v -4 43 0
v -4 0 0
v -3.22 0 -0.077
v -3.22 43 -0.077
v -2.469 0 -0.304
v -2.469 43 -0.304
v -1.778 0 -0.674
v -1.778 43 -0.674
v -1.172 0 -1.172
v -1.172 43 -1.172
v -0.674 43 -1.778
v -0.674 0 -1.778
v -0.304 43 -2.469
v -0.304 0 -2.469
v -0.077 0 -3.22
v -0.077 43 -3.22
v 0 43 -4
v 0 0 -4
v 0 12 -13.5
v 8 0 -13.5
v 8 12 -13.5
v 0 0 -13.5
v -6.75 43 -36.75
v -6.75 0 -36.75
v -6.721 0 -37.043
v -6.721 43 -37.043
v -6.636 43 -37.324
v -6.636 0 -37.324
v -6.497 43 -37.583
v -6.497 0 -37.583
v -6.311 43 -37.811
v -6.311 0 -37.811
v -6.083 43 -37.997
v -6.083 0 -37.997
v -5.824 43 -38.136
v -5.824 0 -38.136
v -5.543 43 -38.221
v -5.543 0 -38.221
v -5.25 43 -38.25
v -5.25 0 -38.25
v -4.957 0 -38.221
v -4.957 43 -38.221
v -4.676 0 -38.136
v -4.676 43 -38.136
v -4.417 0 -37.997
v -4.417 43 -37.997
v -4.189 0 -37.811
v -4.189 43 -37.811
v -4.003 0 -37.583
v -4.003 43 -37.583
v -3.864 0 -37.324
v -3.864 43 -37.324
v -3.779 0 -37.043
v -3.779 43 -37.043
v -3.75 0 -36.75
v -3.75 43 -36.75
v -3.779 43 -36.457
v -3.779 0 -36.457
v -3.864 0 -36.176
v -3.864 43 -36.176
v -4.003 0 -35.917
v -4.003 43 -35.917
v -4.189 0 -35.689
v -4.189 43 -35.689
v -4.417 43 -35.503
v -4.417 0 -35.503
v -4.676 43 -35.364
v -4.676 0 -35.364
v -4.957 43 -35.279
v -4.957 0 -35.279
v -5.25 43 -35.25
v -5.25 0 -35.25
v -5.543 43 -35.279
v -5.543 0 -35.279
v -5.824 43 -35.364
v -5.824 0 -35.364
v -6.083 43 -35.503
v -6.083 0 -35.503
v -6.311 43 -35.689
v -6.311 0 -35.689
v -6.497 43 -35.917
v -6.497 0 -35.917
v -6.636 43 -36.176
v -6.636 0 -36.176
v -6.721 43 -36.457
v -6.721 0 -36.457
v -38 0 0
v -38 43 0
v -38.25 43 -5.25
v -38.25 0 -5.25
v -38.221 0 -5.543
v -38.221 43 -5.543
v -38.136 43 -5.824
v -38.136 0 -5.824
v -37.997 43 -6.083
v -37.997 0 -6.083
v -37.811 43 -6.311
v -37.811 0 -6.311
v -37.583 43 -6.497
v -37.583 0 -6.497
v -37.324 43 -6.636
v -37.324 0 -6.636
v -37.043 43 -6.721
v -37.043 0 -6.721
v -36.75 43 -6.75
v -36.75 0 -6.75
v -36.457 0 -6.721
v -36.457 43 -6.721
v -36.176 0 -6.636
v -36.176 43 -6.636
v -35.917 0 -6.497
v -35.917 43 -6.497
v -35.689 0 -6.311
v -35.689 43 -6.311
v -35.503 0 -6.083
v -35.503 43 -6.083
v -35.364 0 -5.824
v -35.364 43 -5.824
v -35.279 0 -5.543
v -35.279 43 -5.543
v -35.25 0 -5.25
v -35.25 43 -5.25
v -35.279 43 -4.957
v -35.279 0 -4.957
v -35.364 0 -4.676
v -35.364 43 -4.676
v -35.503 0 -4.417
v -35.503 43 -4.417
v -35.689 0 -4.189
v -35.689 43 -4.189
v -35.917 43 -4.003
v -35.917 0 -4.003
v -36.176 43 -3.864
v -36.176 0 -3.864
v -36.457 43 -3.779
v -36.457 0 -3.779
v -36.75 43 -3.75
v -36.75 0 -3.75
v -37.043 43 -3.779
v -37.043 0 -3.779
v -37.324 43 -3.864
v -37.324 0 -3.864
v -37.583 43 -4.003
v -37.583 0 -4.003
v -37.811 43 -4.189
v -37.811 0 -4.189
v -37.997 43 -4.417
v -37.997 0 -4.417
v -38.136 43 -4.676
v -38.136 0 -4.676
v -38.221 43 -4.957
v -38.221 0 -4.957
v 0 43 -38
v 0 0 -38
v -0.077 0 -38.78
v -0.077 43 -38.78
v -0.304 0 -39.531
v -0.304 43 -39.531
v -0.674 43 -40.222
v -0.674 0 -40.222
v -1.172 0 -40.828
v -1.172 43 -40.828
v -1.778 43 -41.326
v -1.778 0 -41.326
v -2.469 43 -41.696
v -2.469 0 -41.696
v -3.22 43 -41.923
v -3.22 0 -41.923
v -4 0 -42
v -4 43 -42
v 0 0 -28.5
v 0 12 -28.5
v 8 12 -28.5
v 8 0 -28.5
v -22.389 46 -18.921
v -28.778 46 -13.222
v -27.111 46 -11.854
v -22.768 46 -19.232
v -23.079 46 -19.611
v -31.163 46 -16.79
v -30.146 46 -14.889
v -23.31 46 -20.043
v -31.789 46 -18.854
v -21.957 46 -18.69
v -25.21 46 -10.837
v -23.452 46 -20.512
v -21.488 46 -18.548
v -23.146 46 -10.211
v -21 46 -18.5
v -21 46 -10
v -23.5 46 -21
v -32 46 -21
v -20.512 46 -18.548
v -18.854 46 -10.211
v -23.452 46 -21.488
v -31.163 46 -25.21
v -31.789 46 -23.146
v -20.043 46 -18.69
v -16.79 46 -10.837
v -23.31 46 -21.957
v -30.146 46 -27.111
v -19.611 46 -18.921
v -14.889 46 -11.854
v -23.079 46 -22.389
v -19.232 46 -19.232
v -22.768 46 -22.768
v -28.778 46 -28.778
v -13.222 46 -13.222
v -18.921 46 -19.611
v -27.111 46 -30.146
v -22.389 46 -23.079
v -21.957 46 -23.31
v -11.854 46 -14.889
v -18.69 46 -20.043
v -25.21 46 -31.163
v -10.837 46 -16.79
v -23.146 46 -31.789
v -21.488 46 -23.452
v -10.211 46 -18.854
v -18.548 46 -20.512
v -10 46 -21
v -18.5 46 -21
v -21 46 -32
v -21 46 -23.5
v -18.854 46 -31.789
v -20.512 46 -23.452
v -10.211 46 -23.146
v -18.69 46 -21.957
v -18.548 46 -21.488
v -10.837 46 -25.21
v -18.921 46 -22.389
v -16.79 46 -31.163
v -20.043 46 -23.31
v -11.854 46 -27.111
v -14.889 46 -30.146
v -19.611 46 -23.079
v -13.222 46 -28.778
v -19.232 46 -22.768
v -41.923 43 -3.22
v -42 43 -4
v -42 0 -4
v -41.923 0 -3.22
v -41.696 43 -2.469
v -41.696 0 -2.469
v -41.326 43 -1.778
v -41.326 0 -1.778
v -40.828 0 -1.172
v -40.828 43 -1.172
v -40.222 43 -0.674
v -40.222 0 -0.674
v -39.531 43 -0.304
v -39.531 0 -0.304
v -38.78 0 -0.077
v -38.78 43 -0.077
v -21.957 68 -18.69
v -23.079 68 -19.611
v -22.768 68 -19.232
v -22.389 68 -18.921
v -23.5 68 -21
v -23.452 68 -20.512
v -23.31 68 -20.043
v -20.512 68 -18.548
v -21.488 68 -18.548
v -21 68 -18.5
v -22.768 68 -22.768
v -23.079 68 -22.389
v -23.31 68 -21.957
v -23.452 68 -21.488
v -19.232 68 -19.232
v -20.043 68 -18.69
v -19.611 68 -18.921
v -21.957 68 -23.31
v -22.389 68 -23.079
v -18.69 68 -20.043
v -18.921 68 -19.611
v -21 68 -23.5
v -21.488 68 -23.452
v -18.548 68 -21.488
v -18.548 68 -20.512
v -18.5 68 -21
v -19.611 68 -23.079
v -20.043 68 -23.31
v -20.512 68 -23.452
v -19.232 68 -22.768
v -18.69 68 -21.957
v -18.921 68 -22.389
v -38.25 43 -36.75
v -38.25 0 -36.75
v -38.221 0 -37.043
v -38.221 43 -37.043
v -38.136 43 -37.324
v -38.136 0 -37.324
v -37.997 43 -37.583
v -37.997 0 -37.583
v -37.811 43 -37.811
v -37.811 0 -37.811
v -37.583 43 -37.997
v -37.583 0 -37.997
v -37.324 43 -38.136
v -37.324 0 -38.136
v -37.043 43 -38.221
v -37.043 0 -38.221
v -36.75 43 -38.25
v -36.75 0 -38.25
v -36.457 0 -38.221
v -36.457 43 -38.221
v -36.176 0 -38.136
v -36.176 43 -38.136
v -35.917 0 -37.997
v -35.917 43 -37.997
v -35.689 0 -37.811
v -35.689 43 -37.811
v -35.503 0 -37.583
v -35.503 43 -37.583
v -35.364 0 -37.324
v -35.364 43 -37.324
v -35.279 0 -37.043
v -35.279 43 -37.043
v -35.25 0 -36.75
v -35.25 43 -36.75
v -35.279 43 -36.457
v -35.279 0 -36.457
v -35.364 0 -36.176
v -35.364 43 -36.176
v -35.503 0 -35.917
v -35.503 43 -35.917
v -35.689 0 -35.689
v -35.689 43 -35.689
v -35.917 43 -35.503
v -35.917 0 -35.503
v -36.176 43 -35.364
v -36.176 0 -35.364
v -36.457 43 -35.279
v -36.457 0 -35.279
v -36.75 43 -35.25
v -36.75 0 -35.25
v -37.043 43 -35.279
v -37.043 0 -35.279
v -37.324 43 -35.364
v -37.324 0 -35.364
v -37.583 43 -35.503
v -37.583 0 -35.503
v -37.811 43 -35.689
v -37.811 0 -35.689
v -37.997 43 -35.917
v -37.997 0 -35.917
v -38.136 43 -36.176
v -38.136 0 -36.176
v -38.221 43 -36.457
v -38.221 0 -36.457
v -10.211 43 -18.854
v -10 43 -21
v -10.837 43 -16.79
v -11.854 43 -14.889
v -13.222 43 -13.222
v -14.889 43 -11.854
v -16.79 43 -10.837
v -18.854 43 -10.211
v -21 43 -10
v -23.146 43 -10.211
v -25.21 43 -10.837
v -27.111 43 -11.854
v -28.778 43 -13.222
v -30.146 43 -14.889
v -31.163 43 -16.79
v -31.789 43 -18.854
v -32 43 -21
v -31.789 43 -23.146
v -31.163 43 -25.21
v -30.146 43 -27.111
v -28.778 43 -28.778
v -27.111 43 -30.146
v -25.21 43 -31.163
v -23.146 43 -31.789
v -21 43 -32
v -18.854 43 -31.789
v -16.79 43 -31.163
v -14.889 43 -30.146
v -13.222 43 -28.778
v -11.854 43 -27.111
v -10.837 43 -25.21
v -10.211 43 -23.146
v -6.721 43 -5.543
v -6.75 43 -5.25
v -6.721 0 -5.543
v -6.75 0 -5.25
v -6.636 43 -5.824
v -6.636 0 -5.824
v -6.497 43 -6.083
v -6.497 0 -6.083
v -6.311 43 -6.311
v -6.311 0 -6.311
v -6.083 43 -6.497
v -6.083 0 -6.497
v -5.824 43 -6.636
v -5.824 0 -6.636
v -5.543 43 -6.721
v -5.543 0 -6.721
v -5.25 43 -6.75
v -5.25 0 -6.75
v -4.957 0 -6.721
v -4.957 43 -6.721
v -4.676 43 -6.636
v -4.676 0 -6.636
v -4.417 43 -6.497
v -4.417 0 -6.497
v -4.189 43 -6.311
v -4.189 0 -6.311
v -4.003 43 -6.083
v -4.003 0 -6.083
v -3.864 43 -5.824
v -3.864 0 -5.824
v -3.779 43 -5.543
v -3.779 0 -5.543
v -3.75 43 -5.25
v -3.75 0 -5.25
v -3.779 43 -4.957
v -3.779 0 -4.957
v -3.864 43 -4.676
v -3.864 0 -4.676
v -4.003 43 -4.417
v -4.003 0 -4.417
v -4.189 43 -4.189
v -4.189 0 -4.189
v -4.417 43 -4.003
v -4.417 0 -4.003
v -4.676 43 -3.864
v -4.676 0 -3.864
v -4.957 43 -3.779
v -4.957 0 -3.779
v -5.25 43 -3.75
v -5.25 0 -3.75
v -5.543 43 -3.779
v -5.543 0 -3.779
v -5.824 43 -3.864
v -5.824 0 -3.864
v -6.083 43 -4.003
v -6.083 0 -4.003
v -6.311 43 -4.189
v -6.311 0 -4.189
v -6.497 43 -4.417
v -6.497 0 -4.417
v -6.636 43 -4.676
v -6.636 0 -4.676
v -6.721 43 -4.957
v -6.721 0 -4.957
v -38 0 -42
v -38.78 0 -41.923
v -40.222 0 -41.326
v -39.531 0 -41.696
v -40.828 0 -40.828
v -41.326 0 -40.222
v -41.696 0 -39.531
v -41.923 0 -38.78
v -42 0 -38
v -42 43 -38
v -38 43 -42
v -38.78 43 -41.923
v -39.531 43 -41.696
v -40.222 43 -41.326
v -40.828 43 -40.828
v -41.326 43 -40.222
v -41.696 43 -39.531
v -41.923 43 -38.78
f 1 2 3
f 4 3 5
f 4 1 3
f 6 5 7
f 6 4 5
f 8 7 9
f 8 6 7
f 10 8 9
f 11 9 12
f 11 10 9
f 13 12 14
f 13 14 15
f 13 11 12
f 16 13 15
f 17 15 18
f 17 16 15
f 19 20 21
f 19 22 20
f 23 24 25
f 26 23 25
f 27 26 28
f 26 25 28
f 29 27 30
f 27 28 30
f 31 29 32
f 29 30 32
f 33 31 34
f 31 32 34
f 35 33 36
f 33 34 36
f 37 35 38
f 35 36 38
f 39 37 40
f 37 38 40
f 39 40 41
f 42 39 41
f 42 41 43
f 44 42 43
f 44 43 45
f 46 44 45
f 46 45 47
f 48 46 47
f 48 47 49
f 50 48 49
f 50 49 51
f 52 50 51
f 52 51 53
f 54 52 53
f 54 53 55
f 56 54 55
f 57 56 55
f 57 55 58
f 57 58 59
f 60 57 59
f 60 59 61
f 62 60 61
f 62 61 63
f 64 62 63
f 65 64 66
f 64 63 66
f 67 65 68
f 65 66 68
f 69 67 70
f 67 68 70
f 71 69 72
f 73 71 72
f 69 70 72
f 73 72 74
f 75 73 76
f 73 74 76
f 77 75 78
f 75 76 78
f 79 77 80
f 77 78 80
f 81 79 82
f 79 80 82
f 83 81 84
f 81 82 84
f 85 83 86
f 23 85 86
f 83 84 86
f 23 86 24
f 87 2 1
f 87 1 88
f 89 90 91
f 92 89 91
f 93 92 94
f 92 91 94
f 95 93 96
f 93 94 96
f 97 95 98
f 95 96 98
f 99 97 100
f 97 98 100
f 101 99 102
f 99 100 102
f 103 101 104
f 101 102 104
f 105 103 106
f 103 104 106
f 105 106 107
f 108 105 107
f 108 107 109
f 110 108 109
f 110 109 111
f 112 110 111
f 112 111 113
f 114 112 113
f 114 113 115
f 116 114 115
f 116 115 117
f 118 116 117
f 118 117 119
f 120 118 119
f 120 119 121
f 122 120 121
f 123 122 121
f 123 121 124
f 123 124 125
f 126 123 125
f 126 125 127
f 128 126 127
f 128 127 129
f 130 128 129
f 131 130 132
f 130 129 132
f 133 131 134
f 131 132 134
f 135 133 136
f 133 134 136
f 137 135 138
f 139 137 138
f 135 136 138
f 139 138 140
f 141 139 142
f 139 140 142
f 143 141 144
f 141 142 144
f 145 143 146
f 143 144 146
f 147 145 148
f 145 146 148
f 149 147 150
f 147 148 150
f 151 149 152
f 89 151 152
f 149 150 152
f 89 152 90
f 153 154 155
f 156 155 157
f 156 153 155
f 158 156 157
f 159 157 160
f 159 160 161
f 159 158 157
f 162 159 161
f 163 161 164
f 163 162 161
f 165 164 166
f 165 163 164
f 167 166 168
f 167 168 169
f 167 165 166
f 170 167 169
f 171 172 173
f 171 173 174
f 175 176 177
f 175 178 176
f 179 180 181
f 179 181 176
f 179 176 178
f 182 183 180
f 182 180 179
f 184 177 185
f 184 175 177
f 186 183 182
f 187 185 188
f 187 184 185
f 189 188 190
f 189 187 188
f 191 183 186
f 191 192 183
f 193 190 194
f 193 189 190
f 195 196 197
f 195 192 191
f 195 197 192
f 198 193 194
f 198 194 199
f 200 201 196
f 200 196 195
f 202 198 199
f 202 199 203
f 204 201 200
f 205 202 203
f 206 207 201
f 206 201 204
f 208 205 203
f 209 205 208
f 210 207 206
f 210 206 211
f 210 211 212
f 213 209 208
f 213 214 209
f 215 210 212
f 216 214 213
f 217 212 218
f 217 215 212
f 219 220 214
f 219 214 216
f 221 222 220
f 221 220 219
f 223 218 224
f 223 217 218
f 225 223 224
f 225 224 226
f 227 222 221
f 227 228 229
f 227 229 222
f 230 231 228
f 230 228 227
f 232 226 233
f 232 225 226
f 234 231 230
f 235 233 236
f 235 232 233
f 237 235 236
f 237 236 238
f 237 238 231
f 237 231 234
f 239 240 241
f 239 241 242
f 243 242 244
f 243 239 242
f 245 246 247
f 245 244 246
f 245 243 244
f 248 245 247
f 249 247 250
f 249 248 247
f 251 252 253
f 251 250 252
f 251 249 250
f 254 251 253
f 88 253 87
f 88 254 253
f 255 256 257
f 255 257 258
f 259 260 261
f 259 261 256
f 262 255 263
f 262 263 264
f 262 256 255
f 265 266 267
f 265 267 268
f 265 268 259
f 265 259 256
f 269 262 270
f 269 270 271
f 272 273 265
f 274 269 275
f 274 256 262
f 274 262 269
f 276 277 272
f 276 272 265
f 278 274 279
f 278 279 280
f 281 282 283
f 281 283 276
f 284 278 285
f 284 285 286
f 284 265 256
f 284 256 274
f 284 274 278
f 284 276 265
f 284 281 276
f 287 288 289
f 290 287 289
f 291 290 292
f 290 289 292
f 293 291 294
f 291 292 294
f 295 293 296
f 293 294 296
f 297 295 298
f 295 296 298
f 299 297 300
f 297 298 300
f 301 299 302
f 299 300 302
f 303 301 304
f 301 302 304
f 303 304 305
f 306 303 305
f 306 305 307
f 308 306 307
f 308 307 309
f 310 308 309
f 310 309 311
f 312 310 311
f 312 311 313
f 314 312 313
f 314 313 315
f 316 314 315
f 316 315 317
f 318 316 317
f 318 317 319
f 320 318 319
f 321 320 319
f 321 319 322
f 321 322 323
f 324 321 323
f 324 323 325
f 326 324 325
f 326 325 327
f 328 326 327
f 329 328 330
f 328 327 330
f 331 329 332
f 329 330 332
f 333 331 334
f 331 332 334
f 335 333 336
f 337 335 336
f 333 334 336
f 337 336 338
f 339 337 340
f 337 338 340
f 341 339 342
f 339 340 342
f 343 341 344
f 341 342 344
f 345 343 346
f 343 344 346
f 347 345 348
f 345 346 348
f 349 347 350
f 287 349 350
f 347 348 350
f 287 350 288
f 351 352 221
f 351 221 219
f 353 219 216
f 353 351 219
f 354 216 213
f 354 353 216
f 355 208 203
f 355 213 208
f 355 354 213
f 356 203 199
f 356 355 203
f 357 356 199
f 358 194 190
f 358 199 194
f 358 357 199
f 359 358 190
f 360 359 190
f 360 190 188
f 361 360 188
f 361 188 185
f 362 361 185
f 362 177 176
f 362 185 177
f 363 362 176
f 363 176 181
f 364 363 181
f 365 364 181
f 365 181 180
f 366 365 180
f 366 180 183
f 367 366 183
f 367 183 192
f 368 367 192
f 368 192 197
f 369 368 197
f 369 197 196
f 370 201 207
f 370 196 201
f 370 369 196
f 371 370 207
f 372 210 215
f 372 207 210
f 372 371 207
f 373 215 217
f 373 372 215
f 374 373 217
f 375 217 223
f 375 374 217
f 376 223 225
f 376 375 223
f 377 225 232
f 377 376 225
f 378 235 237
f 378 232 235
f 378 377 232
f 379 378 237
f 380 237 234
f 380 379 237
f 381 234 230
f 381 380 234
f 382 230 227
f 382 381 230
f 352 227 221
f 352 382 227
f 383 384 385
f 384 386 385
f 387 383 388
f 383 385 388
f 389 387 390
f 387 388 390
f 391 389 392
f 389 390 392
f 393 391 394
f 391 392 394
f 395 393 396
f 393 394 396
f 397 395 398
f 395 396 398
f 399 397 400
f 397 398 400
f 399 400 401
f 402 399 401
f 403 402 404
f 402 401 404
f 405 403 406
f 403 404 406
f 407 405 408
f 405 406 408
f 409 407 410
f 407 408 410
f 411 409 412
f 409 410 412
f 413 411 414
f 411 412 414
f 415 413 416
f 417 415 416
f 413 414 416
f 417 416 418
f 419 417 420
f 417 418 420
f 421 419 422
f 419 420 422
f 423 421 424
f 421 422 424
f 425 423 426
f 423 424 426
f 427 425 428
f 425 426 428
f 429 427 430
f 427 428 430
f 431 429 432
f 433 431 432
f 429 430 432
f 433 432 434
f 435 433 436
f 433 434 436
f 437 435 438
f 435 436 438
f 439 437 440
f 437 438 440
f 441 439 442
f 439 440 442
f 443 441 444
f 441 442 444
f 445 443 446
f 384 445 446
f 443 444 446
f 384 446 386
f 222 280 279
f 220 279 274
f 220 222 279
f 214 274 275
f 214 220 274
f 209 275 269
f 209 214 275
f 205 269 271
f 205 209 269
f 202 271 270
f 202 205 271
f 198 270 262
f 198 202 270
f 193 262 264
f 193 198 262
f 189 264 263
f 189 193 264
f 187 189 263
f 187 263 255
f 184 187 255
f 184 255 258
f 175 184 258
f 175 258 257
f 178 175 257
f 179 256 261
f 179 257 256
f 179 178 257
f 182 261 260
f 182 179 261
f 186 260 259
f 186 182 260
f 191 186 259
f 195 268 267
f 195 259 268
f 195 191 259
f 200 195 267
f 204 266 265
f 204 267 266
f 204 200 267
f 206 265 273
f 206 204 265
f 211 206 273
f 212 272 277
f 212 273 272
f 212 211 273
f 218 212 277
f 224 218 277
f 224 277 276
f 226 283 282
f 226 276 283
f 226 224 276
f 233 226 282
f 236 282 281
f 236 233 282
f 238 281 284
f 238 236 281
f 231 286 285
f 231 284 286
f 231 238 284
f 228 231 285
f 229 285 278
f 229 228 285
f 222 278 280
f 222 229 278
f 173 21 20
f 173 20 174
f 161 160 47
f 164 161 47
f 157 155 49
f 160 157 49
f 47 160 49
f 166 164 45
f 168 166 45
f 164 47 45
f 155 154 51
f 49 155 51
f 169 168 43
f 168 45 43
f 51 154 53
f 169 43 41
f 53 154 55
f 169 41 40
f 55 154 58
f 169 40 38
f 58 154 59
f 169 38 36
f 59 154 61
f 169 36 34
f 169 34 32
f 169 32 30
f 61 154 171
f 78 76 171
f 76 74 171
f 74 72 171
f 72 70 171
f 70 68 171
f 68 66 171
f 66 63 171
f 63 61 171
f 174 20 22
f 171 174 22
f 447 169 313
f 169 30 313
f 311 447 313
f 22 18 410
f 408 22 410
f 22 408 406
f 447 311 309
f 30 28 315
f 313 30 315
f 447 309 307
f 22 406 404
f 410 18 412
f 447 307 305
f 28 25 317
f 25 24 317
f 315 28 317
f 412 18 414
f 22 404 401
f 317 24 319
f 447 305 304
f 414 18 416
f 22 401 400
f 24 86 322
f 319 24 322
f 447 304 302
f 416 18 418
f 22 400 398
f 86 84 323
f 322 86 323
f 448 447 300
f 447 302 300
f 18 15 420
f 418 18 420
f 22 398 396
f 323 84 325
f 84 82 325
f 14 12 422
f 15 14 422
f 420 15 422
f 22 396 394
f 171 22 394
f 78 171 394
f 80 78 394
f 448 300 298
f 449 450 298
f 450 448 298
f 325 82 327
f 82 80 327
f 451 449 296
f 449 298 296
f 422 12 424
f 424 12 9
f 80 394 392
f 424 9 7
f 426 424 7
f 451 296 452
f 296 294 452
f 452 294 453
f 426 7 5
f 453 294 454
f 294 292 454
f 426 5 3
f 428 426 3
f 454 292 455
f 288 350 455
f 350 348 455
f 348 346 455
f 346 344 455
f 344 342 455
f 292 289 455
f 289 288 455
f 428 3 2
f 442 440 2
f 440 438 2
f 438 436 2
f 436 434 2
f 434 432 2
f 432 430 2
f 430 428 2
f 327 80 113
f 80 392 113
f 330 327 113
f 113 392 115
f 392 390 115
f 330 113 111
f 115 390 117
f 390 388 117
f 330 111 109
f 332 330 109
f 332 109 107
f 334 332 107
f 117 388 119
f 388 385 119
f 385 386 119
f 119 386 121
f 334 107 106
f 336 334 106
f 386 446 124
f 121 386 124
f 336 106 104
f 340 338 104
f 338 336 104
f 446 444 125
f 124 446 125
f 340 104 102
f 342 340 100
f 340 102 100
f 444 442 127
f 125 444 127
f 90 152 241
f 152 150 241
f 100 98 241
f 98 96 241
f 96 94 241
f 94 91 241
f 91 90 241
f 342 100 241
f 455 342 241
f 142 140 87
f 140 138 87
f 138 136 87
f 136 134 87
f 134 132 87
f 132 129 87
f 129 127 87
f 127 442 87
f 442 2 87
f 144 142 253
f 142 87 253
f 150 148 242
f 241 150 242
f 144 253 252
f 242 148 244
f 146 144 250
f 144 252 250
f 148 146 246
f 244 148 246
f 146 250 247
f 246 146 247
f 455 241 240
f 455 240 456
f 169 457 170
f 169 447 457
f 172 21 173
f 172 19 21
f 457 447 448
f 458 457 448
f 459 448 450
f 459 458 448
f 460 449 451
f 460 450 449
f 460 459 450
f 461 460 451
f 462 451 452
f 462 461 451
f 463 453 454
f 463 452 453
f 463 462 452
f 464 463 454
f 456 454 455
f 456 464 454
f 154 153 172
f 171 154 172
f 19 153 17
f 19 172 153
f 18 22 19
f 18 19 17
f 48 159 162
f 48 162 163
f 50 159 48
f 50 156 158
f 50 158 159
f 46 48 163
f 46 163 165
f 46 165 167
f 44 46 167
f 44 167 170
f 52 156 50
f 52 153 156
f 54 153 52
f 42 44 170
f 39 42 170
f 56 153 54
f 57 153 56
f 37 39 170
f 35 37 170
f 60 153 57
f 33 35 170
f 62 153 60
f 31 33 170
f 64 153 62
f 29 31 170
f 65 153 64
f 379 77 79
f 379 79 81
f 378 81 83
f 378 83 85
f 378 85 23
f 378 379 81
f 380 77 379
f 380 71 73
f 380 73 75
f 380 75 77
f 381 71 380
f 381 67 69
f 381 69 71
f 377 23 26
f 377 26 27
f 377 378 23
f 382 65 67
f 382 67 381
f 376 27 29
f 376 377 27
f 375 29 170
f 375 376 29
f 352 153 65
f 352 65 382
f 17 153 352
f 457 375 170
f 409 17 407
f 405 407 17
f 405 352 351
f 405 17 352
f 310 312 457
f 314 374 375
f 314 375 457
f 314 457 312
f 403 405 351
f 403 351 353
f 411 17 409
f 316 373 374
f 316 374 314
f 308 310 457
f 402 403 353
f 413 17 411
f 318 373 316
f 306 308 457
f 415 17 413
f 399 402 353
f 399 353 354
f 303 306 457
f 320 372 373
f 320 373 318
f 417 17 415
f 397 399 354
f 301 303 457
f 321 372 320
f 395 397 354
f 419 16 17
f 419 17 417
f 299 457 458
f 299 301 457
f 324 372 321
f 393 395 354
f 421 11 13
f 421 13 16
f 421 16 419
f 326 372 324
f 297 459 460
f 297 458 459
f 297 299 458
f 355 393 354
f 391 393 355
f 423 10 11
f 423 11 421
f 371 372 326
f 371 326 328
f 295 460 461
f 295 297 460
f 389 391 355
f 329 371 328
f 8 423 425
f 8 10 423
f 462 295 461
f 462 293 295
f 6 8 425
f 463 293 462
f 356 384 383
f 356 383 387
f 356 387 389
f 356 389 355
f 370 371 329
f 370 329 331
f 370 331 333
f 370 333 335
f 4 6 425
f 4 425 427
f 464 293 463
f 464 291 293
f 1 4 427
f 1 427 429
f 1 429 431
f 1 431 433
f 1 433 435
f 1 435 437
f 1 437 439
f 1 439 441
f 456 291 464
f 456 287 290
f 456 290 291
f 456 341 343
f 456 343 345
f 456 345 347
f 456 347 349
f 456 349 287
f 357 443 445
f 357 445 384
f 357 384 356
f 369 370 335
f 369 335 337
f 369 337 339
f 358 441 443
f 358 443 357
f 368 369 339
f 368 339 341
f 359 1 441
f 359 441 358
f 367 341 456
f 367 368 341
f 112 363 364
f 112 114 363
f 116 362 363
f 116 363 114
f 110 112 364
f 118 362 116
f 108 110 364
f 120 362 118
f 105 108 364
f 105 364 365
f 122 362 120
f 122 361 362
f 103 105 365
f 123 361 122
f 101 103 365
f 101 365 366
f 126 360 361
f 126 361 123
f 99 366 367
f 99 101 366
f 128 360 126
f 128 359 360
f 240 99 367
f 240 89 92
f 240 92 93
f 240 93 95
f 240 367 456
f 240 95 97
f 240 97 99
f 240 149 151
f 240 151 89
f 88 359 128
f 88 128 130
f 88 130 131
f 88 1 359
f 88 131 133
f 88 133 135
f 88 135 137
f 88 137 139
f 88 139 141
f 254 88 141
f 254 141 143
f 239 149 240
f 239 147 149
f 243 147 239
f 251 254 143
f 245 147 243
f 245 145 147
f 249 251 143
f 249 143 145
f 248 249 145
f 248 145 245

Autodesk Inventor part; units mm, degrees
ref_plane "YZ Plane" through (0, 0, 0) normal (1, 0, 0) x (0, 1, 0)
ref_plane "XZ Plane" through (0, 0, 0) normal (0, 1, 0) x (-1, 0, 0)
ref_plane "XY Plane" through (0, 0, 0) normal (0, 0, 1) x (1, 0, 0)
sketch "Sketch1" plane through (0, 0, 0) normal (0, 1, 0) x (-1, 0, 0)
  line L0 (0, 0) -> (42, 0)
  line L1 (42, 0) -> (42, -42)
  line L2 (42, -42) -> (0, -42)
  line L3 (0, -42) -> (0, 0)
  line L4 (42, -21) -> (42, -5.25)
  line L5 (21, -5.25) -> (36.75, -5.25)
  line L6 (36.75, -5.25) -> (5.25, -5.25)
  line L7 (5.25, -5.25) -> (5.25, -36.75)
  line L8 (5.25, -36.75) -> (36.75, -36.75)
  line L9 (36.75, -36.75) -> (36.75, -5.25)
  circle A0 centre (36.75, -5.25) radius 1.5
  circle A1 centre (36.75, -36.75) radius 1.5
  circle A2 centre (5.25, -36.75) radius 1.5
  circle A3 centre (5.25, -5.25) radius 1.5
  dimension "d6" = 3
  dimension "d7" = 3
  dimension "d8" = 3
  dimension "d9" = 3
extrude "Extrusion1" add sketch "Sketch1" along normal blind 43 contours L0 L1 L2 L3 | L5 A0 L9 A1 L8 A2 L7 A3 L6
sketch "Sketch2" plane through (0, 43, 0) normal (0, 1, 0) x (1, 0, 0)
  circle A0 centre (-21, 21) radius 11
  circle A1 centre (-21, 21) radius 2.5
  point P0 (0, 0)
  dimension "d12" = 22
  dimension "d15" = 5
extrude "Extrusion2" add sketch "Sketch2" along normal blind 3 contours A0 | A1
extrude "Extrusion3" add sketch "Sketch2" along normal blind 25 contours A1
sketch "Sketch3" plane through (0, 0, 0) normal (1, 0, 0) x (0, 0, -1)
  line L0 (42, 0) -> (0, 0) projected
  line L1 (21, 0) -> (28.5, 0)
  line L2 (28.5, 0) -> (13.5, 0)
  line L3 (13.5, 0) -> (13.5, 12)
  line L4 (13.5, 12) -> (28.5, 12)
  line L5 (28.5, 12) -> (28.5, 0)
  dimension "d18" = 7.5
  dimension "d19" = 15
  dimension "d20" = 12
extrude "Extrusion4" add sketch "Sketch3" along normal blind 8
fillet "Fillet1" radius 4 4 edges at (0, 21.5, 0) (0, 21.5, -42) (-42, 21.5, 0) (-42, 21.5, -42)
properties part number "stepperMotor"
